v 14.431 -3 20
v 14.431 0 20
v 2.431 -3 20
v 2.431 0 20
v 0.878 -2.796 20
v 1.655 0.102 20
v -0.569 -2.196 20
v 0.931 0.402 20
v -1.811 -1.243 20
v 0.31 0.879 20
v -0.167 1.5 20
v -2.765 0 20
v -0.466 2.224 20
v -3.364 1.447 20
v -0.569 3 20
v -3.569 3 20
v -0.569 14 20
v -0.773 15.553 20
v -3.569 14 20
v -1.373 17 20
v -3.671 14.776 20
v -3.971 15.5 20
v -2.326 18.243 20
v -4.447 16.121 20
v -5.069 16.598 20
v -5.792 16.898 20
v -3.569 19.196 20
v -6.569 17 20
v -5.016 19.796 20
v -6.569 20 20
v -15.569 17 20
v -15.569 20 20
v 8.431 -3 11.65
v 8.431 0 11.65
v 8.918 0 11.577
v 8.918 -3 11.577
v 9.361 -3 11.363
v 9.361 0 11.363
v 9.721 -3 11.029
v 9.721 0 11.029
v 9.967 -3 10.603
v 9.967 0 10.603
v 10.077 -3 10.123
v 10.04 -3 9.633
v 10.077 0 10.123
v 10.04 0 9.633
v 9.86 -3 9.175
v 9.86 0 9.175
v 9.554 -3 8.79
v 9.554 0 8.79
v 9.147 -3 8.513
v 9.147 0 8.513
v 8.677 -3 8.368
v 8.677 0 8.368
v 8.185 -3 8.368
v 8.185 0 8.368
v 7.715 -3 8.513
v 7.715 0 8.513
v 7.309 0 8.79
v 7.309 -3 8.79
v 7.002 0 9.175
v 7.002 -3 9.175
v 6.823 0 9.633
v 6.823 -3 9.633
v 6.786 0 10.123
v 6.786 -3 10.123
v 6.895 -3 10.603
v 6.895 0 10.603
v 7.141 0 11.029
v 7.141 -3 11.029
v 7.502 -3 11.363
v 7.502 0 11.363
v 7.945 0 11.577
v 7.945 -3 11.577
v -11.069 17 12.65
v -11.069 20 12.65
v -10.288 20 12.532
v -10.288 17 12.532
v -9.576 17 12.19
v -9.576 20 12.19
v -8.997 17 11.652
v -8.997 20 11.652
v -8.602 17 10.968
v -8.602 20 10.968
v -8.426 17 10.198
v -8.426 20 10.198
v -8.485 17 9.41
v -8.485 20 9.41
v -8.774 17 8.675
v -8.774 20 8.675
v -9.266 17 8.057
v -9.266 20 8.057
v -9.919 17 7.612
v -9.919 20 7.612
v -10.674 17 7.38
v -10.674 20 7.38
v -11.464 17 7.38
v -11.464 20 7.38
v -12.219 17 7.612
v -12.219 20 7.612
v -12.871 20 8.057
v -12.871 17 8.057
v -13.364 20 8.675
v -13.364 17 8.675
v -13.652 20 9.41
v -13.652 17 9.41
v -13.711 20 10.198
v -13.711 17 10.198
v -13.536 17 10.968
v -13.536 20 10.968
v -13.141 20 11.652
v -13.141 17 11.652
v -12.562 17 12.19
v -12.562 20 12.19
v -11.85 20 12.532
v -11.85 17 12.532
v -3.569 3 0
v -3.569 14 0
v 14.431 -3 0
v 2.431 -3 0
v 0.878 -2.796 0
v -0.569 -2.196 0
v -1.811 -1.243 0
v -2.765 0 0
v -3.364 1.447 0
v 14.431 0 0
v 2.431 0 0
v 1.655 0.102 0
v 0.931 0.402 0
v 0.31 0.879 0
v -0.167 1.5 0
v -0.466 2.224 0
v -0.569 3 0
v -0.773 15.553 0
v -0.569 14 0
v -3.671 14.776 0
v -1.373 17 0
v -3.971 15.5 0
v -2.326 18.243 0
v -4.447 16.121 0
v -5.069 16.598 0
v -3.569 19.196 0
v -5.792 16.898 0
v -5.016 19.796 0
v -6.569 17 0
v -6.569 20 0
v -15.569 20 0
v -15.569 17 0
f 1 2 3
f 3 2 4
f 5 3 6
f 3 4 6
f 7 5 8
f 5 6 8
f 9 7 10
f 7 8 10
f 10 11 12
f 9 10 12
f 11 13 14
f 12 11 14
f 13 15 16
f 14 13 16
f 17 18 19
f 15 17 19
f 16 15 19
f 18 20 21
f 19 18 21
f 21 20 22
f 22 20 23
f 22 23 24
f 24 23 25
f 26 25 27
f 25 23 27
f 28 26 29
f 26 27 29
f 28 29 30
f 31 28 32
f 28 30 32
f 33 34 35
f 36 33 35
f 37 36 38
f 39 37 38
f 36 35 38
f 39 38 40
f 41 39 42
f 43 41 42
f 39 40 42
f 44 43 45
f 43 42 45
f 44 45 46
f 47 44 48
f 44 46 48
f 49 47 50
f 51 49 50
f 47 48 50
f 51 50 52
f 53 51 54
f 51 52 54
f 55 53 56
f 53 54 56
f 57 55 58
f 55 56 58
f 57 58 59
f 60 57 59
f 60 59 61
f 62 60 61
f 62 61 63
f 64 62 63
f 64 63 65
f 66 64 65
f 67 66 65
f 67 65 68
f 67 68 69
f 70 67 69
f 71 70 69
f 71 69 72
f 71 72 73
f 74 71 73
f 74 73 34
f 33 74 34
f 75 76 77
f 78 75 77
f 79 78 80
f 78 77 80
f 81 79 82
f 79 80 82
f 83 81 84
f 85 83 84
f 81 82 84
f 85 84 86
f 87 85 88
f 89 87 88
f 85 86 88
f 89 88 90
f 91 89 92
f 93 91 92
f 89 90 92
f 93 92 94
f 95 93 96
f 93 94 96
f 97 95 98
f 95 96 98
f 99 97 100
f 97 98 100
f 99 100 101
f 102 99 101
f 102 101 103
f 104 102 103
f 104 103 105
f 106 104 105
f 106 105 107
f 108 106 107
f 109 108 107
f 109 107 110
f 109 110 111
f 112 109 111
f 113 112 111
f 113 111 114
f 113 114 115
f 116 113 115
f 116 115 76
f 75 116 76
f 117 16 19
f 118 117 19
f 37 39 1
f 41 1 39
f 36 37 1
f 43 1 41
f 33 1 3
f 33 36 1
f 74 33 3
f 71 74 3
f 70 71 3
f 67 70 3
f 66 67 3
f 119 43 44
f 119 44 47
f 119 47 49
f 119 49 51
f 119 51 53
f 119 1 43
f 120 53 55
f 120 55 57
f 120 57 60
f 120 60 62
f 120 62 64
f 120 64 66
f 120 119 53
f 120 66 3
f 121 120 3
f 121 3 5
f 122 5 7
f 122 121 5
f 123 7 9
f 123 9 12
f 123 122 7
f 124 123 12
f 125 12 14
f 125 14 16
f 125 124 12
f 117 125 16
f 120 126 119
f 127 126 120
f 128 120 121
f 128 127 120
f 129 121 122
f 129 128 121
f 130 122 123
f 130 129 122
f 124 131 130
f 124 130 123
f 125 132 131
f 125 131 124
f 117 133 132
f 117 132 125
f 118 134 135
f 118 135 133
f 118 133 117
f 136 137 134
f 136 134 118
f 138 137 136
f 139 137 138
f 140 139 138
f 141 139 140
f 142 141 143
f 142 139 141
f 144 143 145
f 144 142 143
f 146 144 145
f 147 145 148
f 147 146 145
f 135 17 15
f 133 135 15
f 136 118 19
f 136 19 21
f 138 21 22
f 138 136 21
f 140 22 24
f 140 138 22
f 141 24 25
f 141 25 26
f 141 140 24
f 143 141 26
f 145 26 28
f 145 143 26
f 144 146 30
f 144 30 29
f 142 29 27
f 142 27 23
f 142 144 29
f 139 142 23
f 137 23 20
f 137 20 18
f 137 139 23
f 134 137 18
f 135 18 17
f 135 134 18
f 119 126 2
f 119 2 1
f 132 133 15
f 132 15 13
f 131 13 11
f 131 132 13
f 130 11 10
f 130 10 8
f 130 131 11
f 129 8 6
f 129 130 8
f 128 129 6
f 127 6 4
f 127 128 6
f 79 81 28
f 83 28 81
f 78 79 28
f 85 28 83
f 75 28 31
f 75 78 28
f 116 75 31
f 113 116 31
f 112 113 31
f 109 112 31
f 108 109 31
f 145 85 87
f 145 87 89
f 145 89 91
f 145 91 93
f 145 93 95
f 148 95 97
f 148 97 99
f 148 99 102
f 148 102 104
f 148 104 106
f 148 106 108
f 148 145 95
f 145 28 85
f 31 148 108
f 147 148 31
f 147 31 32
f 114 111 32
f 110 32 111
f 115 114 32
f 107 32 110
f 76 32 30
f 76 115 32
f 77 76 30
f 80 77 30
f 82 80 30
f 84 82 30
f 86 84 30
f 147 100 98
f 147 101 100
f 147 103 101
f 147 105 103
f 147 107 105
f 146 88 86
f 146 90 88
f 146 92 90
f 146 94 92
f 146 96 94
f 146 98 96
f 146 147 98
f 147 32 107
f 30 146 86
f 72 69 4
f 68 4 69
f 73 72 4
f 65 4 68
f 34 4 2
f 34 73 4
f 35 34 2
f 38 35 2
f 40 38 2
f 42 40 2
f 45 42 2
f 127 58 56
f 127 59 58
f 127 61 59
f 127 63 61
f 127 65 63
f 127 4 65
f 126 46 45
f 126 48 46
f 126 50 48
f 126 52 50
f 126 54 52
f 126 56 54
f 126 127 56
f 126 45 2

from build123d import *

# Parameters (mm, degrees)
BASE_FLANGE1_DEPTH = 20
SKETCH6_R          = 2.65
CUT_EXTRUDE1_DEPTH = 10
SKETCH7_R          = 1.65
CUT_EXTRUDE2_DEPTH = 10


# Sheet-metal steps are written as plain solids
with BuildPart() as part:
    # Sketch1 → Base-Flange1 (new body)
    with BuildSketch(Plane.XY):
        with BuildLine():
            Line((-15.568720379, 20), (-6.568720379, 20))
            ThreePointArc((-6.568720379, 20), (-2.326079692, 18.242640687), (-0.568720379, 14))
            Line((-0.568720379, 14), (-0.568720379, 3))
            ThreePointArc((-0.568720379, 3), (0.309959277, 0.878679656), (2.431279621, 0))
            Line((2.431279621, 0), (14.431279621, 0))
            Line((14.431279621, 0), (14.431279621, -3))
            Line((14.431279621, -3), (2.431279621, -3))
            ThreePointArc((2.431279621, -3), (-1.811361066, -1.242640687), (-3.568720379, 3))
            Line((-3.568720379, 3), (-3.568720379, 14))
            ThreePointArc((-3.568720379, 14), (-4.447400036, 16.121320344), (-6.568720379, 17))
            Line((-6.568720379, 17), (-15.568720379, 17))
            Line((-15.568720379, 17), (-15.568720379, 20))
        make_face()
    extrude(amount=BASE_FLANGE1_DEPTH)

    # Sketch6 → Cut-Extrude1 (cut)
    with BuildSketch(Plane(origin=(0, 20, 0), x_dir=(1, 0, 0), z_dir=(0, 1, 0))):
        with Locations(Location((-11.068720379, -10, 0), (0, 0, 270))):
            Circle(SKETCH6_R)
    extrude(amount=-CUT_EXTRUDE1_DEPTH, mode=Mode.SUBTRACT)

    # Sketch7 → Cut-Extrude2 (cut)
    with BuildSketch(Plane(origin=(0, 0, 0), x_dir=(1, 0, 0), z_dir=(0, 1, 0))):
        with Locations(Location((8.431279621, -10, 0), (0, 0, 270))):
            Circle(SKETCH7_R)
    extrude(amount=-CUT_EXTRUDE2_DEPTH, mode=Mode.SUBTRACT)


solid = part.part
